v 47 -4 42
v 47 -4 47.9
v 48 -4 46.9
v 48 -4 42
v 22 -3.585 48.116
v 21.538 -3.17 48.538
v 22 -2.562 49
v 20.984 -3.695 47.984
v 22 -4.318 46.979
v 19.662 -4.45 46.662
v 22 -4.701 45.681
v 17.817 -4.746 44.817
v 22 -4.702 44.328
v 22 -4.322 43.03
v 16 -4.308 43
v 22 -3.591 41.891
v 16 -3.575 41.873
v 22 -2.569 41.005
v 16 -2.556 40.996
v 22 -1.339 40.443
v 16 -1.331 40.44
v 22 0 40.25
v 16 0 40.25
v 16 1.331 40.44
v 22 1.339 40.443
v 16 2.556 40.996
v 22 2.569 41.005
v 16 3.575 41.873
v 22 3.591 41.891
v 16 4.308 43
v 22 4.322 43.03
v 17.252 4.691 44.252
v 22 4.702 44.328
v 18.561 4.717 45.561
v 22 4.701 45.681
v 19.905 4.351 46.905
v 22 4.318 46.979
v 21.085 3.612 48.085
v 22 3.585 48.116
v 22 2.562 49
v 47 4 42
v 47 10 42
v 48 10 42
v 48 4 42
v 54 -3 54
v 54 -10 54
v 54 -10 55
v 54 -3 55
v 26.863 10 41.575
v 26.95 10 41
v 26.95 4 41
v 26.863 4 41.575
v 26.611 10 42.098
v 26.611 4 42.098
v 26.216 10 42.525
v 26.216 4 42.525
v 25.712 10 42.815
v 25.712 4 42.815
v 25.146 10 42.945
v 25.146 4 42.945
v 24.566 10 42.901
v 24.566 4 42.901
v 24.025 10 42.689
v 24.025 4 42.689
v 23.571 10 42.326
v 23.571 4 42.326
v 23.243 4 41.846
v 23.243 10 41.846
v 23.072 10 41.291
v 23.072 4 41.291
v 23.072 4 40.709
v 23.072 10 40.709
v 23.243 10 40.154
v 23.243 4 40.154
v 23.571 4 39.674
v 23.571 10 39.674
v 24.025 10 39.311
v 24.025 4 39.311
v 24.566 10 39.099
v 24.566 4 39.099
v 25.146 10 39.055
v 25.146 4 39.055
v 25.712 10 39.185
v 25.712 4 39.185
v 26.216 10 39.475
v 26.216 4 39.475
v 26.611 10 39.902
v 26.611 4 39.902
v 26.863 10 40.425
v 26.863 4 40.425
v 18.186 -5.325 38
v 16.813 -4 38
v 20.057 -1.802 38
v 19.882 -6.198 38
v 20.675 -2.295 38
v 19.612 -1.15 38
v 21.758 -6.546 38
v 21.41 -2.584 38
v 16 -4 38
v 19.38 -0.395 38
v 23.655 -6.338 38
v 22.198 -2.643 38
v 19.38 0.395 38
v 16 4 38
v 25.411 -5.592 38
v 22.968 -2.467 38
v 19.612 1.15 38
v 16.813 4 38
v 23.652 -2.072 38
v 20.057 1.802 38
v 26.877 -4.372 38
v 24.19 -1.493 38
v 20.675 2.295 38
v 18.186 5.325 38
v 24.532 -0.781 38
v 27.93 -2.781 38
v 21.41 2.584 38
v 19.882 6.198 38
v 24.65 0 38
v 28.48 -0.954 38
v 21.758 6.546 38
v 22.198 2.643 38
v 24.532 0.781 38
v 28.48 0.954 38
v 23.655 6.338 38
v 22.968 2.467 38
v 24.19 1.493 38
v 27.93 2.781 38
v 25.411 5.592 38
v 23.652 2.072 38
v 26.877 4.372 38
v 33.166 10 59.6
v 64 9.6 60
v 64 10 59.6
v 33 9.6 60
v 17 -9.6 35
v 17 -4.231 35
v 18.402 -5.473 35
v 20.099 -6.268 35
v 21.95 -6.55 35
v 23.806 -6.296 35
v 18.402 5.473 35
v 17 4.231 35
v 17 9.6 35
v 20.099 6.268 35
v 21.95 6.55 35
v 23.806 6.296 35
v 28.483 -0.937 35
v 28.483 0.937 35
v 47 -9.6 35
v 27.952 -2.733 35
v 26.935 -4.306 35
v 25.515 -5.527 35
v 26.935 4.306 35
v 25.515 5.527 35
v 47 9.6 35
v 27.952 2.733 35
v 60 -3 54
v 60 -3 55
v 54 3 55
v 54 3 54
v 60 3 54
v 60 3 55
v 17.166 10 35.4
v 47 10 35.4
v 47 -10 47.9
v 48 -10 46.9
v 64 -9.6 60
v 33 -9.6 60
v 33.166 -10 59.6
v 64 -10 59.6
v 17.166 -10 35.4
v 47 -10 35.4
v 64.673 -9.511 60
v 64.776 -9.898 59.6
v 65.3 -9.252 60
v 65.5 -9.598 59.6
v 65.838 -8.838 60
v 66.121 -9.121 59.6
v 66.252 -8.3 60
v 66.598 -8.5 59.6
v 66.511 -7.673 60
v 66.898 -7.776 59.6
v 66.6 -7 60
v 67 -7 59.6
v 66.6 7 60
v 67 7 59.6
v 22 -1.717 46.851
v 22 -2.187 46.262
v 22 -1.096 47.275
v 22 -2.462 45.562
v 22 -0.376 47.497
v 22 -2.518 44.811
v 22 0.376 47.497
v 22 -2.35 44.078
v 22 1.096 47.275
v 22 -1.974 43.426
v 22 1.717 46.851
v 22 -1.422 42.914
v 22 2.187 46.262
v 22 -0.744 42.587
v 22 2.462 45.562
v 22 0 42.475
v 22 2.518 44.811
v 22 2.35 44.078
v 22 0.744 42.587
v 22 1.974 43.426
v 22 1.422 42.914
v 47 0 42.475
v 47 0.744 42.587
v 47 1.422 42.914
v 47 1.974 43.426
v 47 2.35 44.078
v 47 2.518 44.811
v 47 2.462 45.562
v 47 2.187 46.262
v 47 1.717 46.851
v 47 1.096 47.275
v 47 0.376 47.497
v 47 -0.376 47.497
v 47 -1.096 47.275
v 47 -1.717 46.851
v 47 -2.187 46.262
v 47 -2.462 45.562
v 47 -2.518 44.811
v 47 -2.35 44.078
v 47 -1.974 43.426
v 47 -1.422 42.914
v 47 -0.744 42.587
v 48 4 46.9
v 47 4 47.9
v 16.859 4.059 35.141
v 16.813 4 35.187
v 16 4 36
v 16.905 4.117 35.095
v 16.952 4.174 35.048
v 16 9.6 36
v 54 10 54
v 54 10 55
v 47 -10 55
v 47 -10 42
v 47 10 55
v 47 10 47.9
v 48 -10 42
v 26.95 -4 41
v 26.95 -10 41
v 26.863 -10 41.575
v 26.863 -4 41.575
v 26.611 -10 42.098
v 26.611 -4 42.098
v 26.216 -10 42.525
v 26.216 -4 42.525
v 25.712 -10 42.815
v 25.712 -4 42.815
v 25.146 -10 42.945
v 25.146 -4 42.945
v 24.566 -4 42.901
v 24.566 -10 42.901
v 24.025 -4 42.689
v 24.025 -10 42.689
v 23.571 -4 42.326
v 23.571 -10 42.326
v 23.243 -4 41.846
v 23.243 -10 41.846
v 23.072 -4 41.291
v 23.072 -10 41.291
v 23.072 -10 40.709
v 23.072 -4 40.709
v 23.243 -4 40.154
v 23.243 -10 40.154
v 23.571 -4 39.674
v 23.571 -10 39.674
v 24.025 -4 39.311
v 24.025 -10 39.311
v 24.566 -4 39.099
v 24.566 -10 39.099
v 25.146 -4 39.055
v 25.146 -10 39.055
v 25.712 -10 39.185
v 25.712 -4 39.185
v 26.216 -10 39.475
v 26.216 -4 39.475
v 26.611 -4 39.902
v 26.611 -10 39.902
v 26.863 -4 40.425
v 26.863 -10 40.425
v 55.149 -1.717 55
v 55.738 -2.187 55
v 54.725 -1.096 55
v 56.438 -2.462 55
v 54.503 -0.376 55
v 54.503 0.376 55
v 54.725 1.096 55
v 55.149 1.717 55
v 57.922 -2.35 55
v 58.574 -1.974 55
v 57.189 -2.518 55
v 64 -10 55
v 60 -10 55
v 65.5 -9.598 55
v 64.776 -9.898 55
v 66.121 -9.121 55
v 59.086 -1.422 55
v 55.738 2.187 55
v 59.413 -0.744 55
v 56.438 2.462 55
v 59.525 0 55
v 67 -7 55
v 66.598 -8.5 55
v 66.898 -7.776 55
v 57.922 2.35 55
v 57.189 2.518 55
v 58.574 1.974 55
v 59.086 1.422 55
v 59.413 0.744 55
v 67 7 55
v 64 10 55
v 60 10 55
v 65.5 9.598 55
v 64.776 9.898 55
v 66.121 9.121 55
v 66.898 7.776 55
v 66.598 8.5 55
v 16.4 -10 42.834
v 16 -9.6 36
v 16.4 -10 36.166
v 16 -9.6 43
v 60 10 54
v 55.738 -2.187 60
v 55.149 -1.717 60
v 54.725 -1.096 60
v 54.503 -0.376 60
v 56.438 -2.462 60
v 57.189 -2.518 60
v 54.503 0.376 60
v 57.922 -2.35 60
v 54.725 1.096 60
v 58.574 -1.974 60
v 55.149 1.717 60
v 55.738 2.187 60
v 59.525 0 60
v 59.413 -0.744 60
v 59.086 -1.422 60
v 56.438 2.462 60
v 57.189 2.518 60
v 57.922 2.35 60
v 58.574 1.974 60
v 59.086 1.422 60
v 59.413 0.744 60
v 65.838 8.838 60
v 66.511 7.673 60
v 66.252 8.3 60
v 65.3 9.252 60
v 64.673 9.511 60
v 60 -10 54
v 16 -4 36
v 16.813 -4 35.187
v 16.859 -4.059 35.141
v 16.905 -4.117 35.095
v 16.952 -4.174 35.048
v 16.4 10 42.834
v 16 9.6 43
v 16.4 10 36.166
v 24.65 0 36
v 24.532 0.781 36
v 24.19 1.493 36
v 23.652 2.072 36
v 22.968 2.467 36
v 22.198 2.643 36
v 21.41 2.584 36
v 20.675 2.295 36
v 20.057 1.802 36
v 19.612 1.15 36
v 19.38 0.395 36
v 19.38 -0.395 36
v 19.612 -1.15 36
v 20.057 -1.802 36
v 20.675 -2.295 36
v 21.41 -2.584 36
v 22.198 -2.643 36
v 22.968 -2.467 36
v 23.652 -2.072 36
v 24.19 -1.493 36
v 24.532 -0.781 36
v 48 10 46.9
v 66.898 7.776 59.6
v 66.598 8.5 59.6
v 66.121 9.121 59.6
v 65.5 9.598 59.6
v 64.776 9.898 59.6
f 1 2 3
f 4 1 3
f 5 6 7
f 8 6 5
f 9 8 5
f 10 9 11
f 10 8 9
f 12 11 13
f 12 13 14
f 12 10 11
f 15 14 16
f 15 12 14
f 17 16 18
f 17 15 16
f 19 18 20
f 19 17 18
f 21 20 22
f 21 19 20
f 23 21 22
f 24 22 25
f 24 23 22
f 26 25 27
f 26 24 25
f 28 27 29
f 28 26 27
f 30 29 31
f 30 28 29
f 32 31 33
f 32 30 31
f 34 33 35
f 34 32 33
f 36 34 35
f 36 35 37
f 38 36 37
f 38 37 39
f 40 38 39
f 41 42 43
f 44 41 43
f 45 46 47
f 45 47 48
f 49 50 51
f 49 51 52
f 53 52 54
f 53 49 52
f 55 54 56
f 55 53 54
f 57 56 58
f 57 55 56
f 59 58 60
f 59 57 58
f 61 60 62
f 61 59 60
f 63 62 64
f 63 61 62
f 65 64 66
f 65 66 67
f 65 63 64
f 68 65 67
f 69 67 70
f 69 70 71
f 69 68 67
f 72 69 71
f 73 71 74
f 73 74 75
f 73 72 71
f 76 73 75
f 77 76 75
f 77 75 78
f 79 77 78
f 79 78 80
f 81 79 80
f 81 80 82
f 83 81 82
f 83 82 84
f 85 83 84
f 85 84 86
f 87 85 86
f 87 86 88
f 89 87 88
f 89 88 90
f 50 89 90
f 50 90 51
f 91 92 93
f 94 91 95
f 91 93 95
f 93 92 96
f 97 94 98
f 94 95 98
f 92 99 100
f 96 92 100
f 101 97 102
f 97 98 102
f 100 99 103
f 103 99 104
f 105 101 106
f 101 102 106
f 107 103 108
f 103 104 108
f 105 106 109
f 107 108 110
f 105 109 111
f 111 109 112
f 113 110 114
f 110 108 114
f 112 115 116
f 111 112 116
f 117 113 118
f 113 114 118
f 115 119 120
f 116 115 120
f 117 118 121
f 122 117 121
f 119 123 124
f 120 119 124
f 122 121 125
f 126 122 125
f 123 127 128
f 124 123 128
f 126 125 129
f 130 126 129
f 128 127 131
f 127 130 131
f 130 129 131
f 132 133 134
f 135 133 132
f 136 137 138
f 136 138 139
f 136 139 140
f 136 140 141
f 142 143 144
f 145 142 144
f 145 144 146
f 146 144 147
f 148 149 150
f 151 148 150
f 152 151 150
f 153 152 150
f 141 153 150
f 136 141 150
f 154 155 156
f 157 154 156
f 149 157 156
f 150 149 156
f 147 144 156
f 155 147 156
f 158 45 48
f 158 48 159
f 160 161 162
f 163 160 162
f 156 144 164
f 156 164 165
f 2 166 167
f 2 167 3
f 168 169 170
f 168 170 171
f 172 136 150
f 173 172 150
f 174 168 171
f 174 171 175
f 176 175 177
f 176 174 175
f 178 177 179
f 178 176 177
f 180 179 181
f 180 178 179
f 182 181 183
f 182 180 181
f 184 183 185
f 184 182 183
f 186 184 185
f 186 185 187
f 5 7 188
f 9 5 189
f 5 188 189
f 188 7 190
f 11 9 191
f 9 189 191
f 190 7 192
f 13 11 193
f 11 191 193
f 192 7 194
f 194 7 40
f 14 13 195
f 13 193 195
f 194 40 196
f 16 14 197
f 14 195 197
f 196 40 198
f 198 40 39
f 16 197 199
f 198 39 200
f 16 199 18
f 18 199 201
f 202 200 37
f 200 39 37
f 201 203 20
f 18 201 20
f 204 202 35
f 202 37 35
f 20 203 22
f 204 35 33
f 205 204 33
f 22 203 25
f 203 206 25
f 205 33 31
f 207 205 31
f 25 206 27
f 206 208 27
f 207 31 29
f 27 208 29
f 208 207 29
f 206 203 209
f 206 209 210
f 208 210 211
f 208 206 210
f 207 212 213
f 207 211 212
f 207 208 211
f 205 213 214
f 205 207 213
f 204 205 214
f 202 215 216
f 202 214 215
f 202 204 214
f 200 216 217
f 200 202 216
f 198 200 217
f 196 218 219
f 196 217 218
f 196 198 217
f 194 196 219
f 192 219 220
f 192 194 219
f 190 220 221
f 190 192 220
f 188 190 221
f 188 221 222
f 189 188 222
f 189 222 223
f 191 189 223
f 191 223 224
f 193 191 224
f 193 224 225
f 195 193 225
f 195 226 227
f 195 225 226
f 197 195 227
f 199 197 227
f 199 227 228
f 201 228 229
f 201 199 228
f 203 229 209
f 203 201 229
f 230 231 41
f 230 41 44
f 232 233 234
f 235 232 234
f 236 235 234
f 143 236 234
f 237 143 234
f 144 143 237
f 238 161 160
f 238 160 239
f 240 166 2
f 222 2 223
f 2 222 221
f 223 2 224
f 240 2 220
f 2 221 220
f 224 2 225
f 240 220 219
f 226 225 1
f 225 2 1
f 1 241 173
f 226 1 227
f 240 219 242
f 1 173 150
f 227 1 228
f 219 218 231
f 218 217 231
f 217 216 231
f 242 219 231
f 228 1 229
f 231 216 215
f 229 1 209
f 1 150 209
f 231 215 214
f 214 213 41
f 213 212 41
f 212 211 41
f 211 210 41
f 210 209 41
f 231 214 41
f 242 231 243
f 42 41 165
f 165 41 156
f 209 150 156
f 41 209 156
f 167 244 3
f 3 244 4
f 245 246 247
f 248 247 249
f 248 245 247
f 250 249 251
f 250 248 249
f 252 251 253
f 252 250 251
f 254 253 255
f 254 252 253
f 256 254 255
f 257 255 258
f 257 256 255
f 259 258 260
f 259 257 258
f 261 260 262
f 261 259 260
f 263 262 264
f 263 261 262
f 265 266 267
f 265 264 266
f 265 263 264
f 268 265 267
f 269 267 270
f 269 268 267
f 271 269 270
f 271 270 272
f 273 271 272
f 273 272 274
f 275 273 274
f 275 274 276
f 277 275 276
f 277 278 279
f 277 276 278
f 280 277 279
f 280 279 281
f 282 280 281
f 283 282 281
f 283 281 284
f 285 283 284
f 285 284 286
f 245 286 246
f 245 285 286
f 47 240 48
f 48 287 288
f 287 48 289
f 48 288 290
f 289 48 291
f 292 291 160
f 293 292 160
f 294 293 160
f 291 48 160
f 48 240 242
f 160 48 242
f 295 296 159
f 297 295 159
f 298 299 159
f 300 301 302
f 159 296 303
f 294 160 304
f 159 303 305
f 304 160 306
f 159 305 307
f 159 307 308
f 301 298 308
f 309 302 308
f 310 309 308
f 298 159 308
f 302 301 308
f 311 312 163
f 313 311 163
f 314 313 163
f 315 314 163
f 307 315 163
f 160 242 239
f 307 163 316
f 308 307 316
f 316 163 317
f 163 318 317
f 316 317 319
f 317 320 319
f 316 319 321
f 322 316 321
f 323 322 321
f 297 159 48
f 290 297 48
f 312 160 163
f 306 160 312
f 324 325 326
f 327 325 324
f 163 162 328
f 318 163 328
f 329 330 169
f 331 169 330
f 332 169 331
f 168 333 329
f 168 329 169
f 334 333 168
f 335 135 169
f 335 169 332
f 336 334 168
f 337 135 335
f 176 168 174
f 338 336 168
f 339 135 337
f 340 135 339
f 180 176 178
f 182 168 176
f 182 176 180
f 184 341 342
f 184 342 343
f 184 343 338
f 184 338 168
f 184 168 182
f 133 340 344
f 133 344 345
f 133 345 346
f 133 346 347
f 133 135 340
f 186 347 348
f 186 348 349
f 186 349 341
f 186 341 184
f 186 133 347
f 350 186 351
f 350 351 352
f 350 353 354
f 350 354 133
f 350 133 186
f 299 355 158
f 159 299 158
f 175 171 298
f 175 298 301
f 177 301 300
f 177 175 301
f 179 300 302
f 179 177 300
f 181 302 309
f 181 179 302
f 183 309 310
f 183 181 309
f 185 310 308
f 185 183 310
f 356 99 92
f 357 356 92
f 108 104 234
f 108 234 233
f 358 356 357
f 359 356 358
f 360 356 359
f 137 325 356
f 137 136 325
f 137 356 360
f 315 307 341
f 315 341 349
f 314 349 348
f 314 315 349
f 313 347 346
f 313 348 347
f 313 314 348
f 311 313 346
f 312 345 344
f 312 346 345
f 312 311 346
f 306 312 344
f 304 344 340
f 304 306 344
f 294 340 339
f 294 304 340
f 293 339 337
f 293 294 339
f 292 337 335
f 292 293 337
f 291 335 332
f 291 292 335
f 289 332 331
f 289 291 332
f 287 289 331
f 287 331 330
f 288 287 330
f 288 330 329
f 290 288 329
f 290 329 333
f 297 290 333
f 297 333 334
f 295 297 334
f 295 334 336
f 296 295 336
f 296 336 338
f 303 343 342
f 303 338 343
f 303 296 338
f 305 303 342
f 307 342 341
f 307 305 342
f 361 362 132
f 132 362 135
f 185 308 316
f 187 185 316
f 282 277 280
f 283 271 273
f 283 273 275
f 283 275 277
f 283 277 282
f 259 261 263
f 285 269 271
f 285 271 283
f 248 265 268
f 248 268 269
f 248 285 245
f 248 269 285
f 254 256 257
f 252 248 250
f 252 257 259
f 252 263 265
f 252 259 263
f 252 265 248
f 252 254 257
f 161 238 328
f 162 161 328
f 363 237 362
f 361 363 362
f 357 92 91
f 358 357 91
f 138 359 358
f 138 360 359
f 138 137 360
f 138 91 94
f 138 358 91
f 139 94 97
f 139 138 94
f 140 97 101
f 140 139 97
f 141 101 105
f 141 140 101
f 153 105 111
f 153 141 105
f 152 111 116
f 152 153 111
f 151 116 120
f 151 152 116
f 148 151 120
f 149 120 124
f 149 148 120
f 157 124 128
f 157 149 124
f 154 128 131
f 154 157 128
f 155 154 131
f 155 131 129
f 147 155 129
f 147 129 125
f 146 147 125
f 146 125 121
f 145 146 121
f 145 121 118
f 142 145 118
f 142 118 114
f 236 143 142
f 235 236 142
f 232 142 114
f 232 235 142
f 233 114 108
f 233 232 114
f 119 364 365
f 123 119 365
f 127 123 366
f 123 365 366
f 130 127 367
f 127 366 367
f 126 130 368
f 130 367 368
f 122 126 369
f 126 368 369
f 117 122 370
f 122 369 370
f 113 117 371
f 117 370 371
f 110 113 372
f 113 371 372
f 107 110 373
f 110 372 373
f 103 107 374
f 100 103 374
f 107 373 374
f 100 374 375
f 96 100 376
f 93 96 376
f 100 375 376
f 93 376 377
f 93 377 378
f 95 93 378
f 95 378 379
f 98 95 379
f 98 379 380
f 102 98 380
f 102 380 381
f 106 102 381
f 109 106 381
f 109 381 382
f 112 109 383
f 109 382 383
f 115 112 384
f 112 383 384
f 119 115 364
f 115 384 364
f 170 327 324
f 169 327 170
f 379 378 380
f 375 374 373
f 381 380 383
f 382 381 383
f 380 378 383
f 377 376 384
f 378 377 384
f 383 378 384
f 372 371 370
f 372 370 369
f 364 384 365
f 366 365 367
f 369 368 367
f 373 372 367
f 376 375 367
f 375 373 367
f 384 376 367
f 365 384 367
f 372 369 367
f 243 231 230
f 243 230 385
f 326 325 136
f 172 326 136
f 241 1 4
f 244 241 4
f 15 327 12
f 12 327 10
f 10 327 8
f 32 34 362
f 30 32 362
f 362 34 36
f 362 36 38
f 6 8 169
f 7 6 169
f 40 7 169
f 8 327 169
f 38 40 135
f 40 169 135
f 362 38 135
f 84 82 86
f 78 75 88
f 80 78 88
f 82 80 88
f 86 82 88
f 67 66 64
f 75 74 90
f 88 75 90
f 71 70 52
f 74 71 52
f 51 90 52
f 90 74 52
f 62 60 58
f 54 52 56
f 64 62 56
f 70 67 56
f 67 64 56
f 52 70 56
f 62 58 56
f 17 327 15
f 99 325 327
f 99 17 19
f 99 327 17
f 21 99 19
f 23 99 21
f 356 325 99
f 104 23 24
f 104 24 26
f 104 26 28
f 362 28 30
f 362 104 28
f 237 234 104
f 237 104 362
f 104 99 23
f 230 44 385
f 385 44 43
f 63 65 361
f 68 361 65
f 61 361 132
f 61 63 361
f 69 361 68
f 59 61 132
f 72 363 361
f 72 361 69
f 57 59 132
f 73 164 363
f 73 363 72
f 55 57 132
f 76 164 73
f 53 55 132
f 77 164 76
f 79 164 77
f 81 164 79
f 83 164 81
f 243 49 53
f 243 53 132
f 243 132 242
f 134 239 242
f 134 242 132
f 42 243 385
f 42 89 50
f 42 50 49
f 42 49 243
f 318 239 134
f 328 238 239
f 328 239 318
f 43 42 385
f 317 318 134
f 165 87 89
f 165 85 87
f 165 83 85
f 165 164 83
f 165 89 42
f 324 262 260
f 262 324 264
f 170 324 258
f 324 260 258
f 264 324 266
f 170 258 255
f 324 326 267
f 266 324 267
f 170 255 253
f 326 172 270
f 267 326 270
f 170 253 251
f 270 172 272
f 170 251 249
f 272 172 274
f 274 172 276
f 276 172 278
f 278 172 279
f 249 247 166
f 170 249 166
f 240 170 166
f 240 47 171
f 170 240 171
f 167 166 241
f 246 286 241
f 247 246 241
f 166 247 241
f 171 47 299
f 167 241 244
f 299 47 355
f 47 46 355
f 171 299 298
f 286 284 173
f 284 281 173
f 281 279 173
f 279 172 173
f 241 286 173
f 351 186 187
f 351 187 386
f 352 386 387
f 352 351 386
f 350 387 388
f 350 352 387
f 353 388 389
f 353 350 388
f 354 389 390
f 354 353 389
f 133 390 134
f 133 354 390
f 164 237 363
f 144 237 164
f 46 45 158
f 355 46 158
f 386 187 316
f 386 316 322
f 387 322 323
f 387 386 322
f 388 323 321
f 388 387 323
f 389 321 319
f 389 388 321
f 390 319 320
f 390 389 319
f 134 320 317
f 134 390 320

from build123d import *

# Parameters (mm, degrees)
CYLINDER022_R                        = 1.95
CYLINDER022_DEPTH                    = 10
CYLINDER021_R                        = 1.95
CYLINDER021_DEPTH                    = 10
BOX026_W                             = 2
BOX026_H                             = 6
BOX026_DEPTH                         = 5.9
BOX027_W                             = 2
BOX027_H                             = 6
BOX027_DEPTH                         = 5.9
CHAMFER004013007011015006009004_SIZE = 1
CYLINDER018_R                        = 2.525
CYLINDER018_DEPTH                    = 37
CYLINDER019_R                        = 4.75
CYLINDER019_DEPTH                    = 8
CYLINDER017_R                        = 2.65
CYLINDER017_DEPTH                    = 2
CYLINDER016_R                        = 6.55
CYLINDER016_DEPTH                    = 5
BOX030_W                             = 12
BOX030_H                             = 8
BOX030_DEPTH                         = 10
BOX024_W                             = 31
BOX024_H                             = 20
BOX024_DEPTH                         = 25
CHAMFER004013007011015006009005_SIZE = 17
CHAMFER004013007011015006009006_SIZE = 1
BOX028_W                             = 6
BOX028_H                             = 7
BOX028_DEPTH                         = 1
BOX029_W                             = 6
BOX029_H                             = 7
BOX029_DEPTH                         = 1
CYLINDER020_R                        = 2.525
CYLINDER020_DEPTH                    = 10
BOX025_W                             = 20
BOX025_H                             = 20
BOX025_DEPTH                         = 5
FILLET001_R                          = 3
CHAMFER004013007011015006009007_SIZE = 0.4


with BuildPart() as cylinder022:
    # Cylinder022 → Cylinder022 (new body)
    with BuildSketch(Plane(origin=(24, 14, 41), x_dir=(1, 0, 0), z_dir=(0, -1, 0))):
        Circle(CYLINDER022_R)
    extrude(amount=CYLINDER022_DEPTH)


with BuildPart() as fusion004031:
    # Cylinder021 → Cylinder021 (new body)
    with BuildSketch(Plane(origin=(24, -4, 41), x_dir=(1, 0, 0), z_dir=(0, -1, 0))):
        Circle(CYLINDER021_R)
    extrude(amount=CYLINDER021_DEPTH)

    # Fusion004031: union Cylinder022
    add(cylinder022.part)


with BuildPart() as fusion004031_1:
    # Fusion004031 placement: moved
    add(fusion004031.part.moved(Location((1, 0, 0))))


with BuildPart() as cube026:
    # Box026 → Box026 (new body)
    with BuildSketch(Plane(origin=(46, -10, 47), x_dir=(1, 0, 0), z_dir=(0, 0, 1))):
        with Locations((1, 3)):
            Rectangle(BOX026_W, BOX026_H)
    extrude(amount=BOX026_DEPTH)


with BuildPart() as chamfer004013007011015006009004:
    # Box027 → Box027 (new body)
    with BuildSketch(Plane(origin=(46, 4, 47), x_dir=(1, 0, 0), z_dir=(0, 0, 1))):
        with Locations((1, 3)):
            Rectangle(BOX027_W, BOX027_H)
    extrude(amount=BOX027_DEPTH)

    # Fusion004032: union Cube026
    add(cube026.part)


with BuildPart() as chamfer004013007011015006009004_1:
    # Fusion004032 placement: moved
    add(chamfer004013007011015006009004.part.moved(Location((0, 0, -5.1))))

    # Chamfer004013007011015006009004
    chamfer004013007011015006009004_edges = [chamfer004013007011015006009004_1.edges().sort_by_distance(p)[0] for p in [
        (48, 7, 47.8),
        (48, -7, 47.8),
    ]]
    chamfer(chamfer004013007011015006009004_edges, length=CHAMFER004013007011015006009004_SIZE)


with BuildPart() as chamfer004013007011015006009004_2:
    # Chamfer004013007011015006009004 placement: moved
    add(chamfer004013007011015006009004_1.part.moved(Location((0, 0, 0.1))))


with BuildPart() as cylinder018:
    # Cylinder018 → Cylinder018 (new body)
    with BuildSketch(Plane(origin=(14, 0, 45), x_dir=(0, 0, -1), z_dir=(1, 0, 0))):
        Circle(CYLINDER018_R)
    extrude(amount=CYLINDER018_DEPTH)


with BuildPart() as fusion004035:
    # Cylinder019 → Cylinder019 (new body)
    with BuildSketch(Plane(origin=(14, 0, 45), x_dir=(0, 0, -1), z_dir=(1, 0, 0))):
        Circle(CYLINDER019_R)
    extrude(amount=CYLINDER019_DEPTH)

    # Fusion004035: union Cylinder018
    add(cylinder018.part)


with BuildPart() as cylinder017:
    # Cylinder017 → Cylinder017 (new body)
    with BuildSketch(Plane.XY.offset(3)):
        Circle(CYLINDER017_R)
    extrude(amount=CYLINDER017_DEPTH)


with BuildPart() as cut028006004005015:
    # Cylinder016 → Cylinder016 (new body)
    with BuildSketch(Plane.XY):
        Circle(CYLINDER016_R)
    extrude(amount=CYLINDER016_DEPTH)

    # Cut028006004005015: cut Cylinder017
    add(cylinder017.part, mode=Mode.SUBTRACT)


with BuildPart() as cut028006004005015_1:
    # Cut028006004005015 placement: moved
    add(cut028006004005015.part.moved(Location((22, 0, 33))))


with BuildPart() as fusion004030:
    # Box030 → Box030 (new body)
    with BuildSketch(Plane(origin=(7, -4, 28), x_dir=(1, 0, 0), z_dir=(0, 0, 1))):
        with Locations((6, 4)):
            Rectangle(BOX030_W, BOX030_H)
    extrude(amount=BOX030_DEPTH)

    # Fusion004030: union Cut028006004005015
    add(cut028006004005015_1.part)


with BuildPart() as cut028006004005011003:
    # Box024 → Box024 (new body)
    with BuildSketch(Plane(origin=(16, -10, 35), x_dir=(1, 0, 0), z_dir=(0, 0, 1))):
        with Locations((15.5, 10)):
            Rectangle(BOX024_W, BOX024_H)
    extrude(amount=BOX024_DEPTH)

    # Cut028006004005017: cut Fusion004030
    add(fusion004030.part, mode=Mode.SUBTRACT)

    # Chamfer004013007011015006009005
    chamfer004013007011015006009005_edges = [cut028006004005011003.edges().sort_by_distance(p)[0] for p in [
        (16, 0, 60),
    ]]
    chamfer(chamfer004013007011015006009005_edges, length=CHAMFER004013007011015006009005_SIZE)

    # Cut028006004005018: cut Fusion004035
    add(fusion004035.part, mode=Mode.SUBTRACT)

    # Chamfer004013007011015006009006
    chamfer004013007011015006009006_edges = [cut028006004005011003.edges().sort_by_distance(p)[0] for p in [
        (16, 7, 35),
        (16, -7, 35),
    ]]
    chamfer(chamfer004013007011015006009006_edges, length=CHAMFER004013007011015006009006_SIZE)

    # Fusion004025007: union Chamfer004013007011015006009004
    add(chamfer004013007011015006009004_2.part)

    # Cut028006004005011003: cut Fusion004031
    add(fusion004031_1.part, mode=Mode.SUBTRACT)


with BuildPart() as cube028:
    # Box028 → Box028 (new body)
    with BuildSketch(Plane(origin=(54, -10, 40), x_dir=(1, 0, 0), z_dir=(0, 0, 1))):
        with Locations((3, 3.5)):
            Rectangle(BOX028_W, BOX028_H)
    extrude(amount=BOX028_DEPTH)


with BuildPart() as cube029:
    # Box029 → Box029 (new body)
    with BuildSketch(Plane(origin=(54, 3, 40), x_dir=(1, 0, 0), z_dir=(0, 0, 1))):
        with Locations((3, 3.5)):
            Rectangle(BOX029_W, BOX029_H)
    extrude(amount=BOX029_DEPTH)


with BuildPart() as cylinder020:
    # Cylinder020 → Cylinder020 (new body)
    with BuildSketch(Plane(origin=(57, 0, 32), x_dir=(1, 0, 0), z_dir=(0, 0, 1))):
        Circle(CYLINDER020_R)
    extrude(amount=CYLINDER020_DEPTH)


with BuildPart() as bed_frame_mount_top:
    # Box025 → Box025 (new body)
    with BuildSketch(Plane(origin=(47, -10, 35), x_dir=(1, 0, 0), z_dir=(0, 0, 1))):
        with Locations((10, 10)):
            Rectangle(BOX025_W, BOX025_H)
    extrude(amount=BOX025_DEPTH)

    # Fillet001
    fillet001_edges = [bed_frame_mount_top.edges().sort_by_distance(p)[0] for p in [
        (67, -10, 37.5),
        (67, 10, 37.5),
    ]]
    fillet(fillet001_edges, radius=FILLET001_R)

    # Cut028006004005016: cut Cylinder020
    add(cylinder020.part, mode=Mode.SUBTRACT)


with BuildPart() as bed_frame_mount_top_1:
    # Cut028006004005016 placement: moved
    add(bed_frame_mount_top.part.moved(Location((0, 0, 6))))

    # Fusion004034: union Cube028, Cube029
    add(cube028.part)
    add(cube029.part)


with BuildPart() as bed_frame_mount_top_2:
    # Fusion004034 placement: moved
    add(bed_frame_mount_top_1.part.moved(Location((0, 0, 14))))

    # Fusion004025008: union Cut028006004005011003
    add(cut028006004005011003.part)

    # Chamfer004013007011015006009007
    chamfer004013007011015006009007_edges = [bed_frame_mount_top_2.edges().sort_by_distance(p)[0] for p in [
        (67, 0, 60),
        (55.5, 10, 60),
        (66.12132, 9.12132, 60),
        (55.5, -10, 60),
        (66.12132, -9.12132, 60),
        (40, 10, 60),
        (40, -10, 60),
        (16.5, 10, 35.5),
        (16, 10, 39.5),
        (32, 10, 35),
        (24.5, 10, 51.5),
        (24.5, -10, 51.5),
        (16.5, -10, 35.5),
        (16, -10, 39.5),
        (32, -10, 35),
    ]]
    chamfer(chamfer004013007011015006009007_edges, length=CHAMFER004013007011015006009007_SIZE)


solid = bed_frame_mount_top_2.part
